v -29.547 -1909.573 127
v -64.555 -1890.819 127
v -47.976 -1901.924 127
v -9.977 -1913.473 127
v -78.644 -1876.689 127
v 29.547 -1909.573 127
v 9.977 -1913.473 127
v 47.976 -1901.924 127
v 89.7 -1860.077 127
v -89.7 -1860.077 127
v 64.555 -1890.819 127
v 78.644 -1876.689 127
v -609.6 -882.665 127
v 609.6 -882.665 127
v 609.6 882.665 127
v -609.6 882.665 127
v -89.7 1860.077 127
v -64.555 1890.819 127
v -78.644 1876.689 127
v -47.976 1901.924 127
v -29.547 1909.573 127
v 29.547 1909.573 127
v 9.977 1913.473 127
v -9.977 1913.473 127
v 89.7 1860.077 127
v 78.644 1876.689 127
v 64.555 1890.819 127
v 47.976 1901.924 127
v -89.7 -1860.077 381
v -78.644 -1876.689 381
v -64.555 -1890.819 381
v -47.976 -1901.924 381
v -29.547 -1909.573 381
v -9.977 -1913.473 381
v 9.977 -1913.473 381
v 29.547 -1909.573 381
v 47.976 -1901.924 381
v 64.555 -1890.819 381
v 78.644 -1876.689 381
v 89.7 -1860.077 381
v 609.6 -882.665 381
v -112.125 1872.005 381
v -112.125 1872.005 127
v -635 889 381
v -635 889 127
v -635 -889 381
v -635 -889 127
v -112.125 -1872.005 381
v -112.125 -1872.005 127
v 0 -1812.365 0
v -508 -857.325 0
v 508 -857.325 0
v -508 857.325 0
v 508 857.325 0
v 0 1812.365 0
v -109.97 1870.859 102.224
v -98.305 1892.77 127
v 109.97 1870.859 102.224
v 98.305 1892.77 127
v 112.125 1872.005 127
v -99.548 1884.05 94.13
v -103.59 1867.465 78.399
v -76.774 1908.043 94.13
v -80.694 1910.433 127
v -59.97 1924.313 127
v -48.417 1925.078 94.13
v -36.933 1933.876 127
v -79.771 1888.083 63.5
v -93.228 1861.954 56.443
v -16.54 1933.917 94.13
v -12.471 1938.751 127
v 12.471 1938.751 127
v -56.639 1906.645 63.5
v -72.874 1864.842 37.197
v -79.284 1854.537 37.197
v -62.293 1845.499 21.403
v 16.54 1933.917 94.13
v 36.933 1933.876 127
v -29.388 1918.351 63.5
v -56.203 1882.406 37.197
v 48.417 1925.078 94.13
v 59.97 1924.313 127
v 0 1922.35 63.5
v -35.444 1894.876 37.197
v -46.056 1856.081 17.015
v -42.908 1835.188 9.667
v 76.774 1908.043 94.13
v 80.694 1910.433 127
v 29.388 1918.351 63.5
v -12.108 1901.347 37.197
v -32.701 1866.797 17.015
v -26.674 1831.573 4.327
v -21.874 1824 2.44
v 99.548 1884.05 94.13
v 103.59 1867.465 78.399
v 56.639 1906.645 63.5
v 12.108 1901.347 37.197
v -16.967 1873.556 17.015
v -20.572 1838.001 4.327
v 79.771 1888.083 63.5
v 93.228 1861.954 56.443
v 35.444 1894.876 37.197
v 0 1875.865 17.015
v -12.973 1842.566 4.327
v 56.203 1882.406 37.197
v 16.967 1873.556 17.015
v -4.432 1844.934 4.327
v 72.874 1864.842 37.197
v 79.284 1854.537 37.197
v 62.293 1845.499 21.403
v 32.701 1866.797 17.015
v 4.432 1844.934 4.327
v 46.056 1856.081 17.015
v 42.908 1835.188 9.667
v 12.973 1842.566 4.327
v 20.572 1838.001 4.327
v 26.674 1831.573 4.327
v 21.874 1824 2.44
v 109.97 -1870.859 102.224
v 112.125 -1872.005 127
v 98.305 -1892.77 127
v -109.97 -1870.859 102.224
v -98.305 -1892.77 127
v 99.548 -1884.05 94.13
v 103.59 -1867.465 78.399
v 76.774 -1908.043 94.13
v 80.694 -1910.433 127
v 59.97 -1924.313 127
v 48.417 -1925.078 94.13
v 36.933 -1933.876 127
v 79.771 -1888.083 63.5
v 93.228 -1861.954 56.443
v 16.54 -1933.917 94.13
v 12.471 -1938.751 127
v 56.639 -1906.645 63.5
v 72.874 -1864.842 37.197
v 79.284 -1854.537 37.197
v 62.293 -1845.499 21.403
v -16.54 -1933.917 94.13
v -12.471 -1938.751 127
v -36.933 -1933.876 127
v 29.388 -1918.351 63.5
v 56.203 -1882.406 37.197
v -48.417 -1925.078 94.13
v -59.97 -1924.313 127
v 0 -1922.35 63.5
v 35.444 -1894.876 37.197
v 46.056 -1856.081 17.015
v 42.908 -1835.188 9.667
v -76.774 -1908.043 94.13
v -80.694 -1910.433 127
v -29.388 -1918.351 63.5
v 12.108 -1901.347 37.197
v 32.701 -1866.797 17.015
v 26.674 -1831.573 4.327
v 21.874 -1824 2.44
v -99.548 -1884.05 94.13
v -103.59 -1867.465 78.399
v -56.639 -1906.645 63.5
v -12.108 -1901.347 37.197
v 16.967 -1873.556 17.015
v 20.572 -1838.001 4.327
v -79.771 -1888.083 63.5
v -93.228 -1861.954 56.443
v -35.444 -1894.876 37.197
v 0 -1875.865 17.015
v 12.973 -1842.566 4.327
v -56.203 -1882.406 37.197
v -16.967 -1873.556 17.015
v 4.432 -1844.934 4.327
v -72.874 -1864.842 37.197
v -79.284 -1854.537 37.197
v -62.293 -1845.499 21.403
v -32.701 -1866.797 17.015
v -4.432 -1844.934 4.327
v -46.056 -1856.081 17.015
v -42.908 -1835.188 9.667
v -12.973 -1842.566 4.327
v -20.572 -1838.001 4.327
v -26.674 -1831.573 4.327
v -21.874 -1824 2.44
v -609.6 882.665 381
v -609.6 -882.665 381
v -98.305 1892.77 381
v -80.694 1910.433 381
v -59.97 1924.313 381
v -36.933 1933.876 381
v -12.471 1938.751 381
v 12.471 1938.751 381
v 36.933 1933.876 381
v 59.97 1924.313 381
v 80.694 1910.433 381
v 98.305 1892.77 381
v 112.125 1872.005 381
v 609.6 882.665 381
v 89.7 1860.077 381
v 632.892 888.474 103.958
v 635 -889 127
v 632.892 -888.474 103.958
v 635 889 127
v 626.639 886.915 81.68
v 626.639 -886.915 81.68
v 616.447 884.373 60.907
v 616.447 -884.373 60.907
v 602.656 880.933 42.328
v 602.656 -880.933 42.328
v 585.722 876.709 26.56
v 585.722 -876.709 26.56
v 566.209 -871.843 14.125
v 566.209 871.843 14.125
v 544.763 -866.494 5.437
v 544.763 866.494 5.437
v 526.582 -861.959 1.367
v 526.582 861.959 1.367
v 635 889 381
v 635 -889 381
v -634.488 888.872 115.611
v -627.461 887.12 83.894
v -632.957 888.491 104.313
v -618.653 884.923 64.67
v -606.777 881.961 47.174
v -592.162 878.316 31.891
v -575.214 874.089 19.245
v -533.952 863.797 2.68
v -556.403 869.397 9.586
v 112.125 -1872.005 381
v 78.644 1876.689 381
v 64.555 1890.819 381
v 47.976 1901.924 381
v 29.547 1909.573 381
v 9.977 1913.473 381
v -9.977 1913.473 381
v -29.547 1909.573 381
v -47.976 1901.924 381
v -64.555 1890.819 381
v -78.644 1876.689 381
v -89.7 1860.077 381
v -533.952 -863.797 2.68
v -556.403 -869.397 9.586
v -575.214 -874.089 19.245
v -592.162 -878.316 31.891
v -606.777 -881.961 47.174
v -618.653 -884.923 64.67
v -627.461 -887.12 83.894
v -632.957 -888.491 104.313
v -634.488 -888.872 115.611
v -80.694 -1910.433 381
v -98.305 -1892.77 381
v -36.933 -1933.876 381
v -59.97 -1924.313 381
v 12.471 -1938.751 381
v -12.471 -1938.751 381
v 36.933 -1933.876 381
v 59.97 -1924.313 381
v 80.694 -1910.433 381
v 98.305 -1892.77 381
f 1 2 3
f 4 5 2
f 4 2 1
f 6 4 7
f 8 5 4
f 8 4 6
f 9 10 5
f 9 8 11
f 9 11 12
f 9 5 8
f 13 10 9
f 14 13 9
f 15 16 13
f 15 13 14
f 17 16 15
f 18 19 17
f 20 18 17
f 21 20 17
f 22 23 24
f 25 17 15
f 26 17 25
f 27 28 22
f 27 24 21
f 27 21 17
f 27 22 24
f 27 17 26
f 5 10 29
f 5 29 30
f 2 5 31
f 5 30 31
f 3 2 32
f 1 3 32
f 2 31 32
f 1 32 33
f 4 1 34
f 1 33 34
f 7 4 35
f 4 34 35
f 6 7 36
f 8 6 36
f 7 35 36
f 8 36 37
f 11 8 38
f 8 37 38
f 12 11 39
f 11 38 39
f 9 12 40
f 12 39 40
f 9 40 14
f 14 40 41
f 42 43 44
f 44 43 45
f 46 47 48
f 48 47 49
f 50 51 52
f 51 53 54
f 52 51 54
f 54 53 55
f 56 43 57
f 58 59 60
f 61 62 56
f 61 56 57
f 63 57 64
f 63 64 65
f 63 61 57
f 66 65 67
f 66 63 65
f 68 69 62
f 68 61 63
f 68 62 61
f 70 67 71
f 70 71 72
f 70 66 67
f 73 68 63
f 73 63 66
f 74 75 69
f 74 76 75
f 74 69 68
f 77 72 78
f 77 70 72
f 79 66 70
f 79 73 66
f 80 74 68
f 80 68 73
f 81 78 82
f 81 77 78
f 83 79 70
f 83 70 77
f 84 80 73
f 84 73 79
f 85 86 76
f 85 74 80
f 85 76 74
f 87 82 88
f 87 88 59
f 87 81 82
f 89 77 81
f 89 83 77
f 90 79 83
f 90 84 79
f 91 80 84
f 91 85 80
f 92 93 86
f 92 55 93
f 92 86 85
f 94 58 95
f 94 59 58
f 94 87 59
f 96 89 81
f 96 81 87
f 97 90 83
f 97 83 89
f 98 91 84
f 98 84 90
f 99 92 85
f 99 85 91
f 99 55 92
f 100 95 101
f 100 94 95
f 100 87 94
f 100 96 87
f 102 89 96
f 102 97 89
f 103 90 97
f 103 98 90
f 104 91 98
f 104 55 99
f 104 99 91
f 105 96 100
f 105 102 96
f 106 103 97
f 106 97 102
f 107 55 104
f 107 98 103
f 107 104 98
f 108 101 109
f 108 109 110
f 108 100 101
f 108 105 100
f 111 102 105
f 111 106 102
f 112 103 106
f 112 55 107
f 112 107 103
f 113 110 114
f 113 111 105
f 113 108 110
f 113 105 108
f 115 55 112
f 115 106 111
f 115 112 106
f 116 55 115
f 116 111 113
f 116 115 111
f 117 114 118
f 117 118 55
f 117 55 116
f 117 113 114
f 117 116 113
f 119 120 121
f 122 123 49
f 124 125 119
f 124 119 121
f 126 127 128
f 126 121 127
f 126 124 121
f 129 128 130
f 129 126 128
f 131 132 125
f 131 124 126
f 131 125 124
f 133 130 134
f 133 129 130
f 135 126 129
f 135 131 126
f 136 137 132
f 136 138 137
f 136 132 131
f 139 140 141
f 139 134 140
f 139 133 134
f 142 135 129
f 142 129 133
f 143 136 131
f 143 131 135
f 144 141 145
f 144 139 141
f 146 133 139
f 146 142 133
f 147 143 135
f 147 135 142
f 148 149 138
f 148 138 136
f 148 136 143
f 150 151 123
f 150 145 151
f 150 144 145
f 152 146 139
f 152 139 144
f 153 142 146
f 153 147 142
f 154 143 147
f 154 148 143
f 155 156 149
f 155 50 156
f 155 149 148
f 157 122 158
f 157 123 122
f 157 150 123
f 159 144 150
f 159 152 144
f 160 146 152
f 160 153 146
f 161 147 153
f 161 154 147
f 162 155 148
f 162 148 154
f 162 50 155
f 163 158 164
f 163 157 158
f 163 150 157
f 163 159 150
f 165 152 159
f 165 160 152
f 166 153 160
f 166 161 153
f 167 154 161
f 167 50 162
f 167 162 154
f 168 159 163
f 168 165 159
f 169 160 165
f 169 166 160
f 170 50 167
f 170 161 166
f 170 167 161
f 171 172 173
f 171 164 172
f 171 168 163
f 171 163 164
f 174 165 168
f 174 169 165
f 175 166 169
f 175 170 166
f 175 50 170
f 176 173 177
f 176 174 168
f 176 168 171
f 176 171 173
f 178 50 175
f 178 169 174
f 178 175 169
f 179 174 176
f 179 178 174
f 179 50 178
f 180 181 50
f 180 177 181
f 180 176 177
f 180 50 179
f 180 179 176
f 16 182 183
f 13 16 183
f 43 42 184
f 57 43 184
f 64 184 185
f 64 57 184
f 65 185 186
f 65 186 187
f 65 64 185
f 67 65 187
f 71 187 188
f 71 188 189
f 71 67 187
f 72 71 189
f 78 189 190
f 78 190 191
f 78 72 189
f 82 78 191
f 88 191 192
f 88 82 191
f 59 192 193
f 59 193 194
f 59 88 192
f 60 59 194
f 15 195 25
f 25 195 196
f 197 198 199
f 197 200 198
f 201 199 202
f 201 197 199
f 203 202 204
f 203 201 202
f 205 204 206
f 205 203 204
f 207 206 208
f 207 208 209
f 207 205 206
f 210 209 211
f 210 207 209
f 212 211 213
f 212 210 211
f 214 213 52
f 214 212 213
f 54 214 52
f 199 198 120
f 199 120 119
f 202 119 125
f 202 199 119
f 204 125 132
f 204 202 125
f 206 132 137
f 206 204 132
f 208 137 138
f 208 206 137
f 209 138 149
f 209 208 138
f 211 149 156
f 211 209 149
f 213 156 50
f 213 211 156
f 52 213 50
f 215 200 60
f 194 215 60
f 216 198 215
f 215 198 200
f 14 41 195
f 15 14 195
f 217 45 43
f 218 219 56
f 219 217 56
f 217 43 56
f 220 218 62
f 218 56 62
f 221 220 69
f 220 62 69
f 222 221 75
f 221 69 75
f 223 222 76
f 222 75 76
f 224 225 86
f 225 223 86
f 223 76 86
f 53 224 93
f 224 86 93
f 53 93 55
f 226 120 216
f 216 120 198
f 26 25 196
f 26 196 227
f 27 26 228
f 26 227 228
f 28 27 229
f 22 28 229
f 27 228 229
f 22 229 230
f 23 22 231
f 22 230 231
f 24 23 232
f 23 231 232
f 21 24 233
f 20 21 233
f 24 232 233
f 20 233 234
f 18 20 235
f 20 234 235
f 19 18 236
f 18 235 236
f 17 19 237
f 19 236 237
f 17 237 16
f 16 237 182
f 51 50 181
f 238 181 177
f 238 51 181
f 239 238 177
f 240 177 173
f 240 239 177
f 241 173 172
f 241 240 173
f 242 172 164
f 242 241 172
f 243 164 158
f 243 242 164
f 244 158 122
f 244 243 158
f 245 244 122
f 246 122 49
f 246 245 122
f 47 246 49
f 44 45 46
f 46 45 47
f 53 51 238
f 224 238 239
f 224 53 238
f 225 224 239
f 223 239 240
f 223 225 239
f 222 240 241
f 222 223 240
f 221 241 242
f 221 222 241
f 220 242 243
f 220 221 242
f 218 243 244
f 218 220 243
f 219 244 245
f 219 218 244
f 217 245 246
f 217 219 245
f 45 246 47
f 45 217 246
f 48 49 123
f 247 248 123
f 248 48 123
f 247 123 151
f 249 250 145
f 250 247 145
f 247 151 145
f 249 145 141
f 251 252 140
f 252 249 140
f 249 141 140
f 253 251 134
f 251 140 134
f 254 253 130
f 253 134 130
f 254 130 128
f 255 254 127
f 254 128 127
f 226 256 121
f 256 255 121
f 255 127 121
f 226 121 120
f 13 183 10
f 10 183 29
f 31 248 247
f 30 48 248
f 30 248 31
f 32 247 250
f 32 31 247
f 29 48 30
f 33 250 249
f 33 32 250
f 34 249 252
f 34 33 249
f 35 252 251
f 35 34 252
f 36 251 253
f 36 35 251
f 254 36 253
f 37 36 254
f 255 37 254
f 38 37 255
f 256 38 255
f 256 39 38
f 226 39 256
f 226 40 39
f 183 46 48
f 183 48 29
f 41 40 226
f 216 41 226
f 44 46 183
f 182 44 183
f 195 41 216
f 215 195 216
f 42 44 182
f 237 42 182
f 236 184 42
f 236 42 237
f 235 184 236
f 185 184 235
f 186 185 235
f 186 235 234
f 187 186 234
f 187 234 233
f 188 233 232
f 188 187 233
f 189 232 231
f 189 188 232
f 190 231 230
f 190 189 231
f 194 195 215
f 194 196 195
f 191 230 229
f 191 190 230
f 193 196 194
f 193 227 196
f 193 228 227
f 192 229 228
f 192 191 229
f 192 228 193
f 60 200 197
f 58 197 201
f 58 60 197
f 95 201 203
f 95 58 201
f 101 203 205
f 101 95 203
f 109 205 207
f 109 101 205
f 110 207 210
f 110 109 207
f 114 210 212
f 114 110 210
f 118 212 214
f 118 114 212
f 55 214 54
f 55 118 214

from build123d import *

# Parameters (mm, degrees)
F1_DEPTH     = 381
F2_R         = 127
F3_T1_DEPTH  = 1430.9172960673
F3_T3_DEPTH  = 2413
F3_T5_DEPTH  = 1430.9172960673
F3_T7_DEPTH  = 850.9
F3_T12_DEPTH = 127
F3_T18_DEPTH = 127
F5_DEPTH     = 254


# Not quite as in the source:
# - a fillet or chamfer that OpenCascade refuses, or shapes differently, is made with other operations: its cross-section is extruded or revolved along the edge and cut away or added


with BuildPart() as f1:
    # F0 (on Top) → F1 (new body)
    with BuildSketch(Plane.XY):
        Polygon((-635, 0), (0, 0), (0, 2082.8), (-635, 889), align=None)
        Polygon((635, 0), (0, 0), (-635, 0), (-635, -889), (0, -2082.8), (635, -889), align=None)
        Polygon((0, 2082.8), (0, 0), (635, 0), (635, 889), align=None)
    extrude(amount=F1_DEPTH)

    # F2
    f2_edges = [f1.edges().sort_by_distance(p)[0] for p in [
        (635, 0, 0),
        (317.5, -1485.9, 0),
        (317.5, 1485.9, 0),
    ]]
    fillet(f2_edges, radius=F2_R)

    # F3: fillet of radius 127 on 3 edges, made by hand

    # F3_s2 → F3_t1 (cut)
    with BuildSketch(Plane(origin=(751.4214309895, 1412.6722902602, 0), x_dir=(0, 0, 1), z_dir=(-0.469612973, -0.8828723892, 0))):
        with BuildLine():
            ThreePointArc((127, 978.1099001193), (37.1974387893, 940.91246133), (0, 851.1099001193))
            Line((0, 851.1099001193), (0, 978.1099001193))
            Line((0, 978.1099001193), (127, 978.1099001193))
        make_face()
    extrude(amount=F3_T1_DEPTH, mode=Mode.SUBTRACT)

    # F3_s4 → F3_t3 (cut)
    with BuildSketch(Plane.XZ.offset(-1206.5)):
        with BuildLine():
            ThreePointArc((-508, 0), (-597.8025612107, 37.1974387893), (-635, 127))
            Line((-635, 127), (-635, 0))
            Line((-635, 0), (-508, 0))
        make_face()
    extrude(amount=F3_T3_DEPTH, mode=Mode.SUBTRACT)

    # F3_s6 → F3_t5 (cut)
    with BuildSketch(Plane(origin=(79.4441054972, -149.3549183347, 0), x_dir=(0, 0, 1), z_dir=(0.469612973, -0.8828723892, 0))):
        with BuildLine():
            ThreePointArc((0, 851.1099001193), (37.1974387893, 940.91246133), (127, 978.1099001193))
            Line((127, 978.1099001193), (0, 978.1099001193))
            Line((0, 978.1099001193), (0, 851.1099001193))
        make_face()
    extrude(amount=F3_T5_DEPTH, mode=Mode.SUBTRACT)

    # F3_s8 → F3_t7 (cut)
    with BuildSketch(Plane.XY.offset(127)):
        with BuildLine():
            ThreePointArc((-112.1247934283, -1872.0053883548), (0, -1939.3645407865), (112.1247934283, -1872.0053883548))
            Line((112.1247934283, -1872.0053883548), (0, -2082.8))
            Line((0, -2082.8), (-112.1247934283, -1872.0053883548))
        make_face()
        with BuildLine():
            ThreePointArc((-112.1247934283, 1872.0053883548), (0, 1939.3645407865), (112.1247934283, 1872.0053883548))
            Line((112.1247934283, 1872.0053883548), (0, 2082.8))
            Line((0, 2082.8), (-112.1247934283, 1872.0053883548))
        make_face()
    extrude(amount=F3_T7_DEPTH, mode=Mode.SUBTRACT)


with BuildPart() as f3_tool10:
    # F3_s11 → F3_t12 (new body)
    with BuildSketch(Plane.XY.offset(127)):
        Polygon((0, -1812.3645407865), (-112.1247934283, -1872.0053883548), (0, -2082.8), (112.1247934283, -1872.0053883548), align=None)
    extrude(amount=-F3_T12_DEPTH)

    # F3_s13 → F3_t14 (revolve, cut)
    with BuildSketch(Plane(origin=(0, -1812.3645407865, 127), x_dir=(0, 1, 0), z_dir=(-1, 0, 0))):
        with BuildLine():
            ThreePointArc((0, -127), (127, 0), (0, 127))
            Line((0, 127), (0, -127))
        make_face()
    revolve(axis=Axis((0, -1812.3645407865, 127), (0, 0, -1)), mode=Mode.SUBTRACT)


with BuildPart() as f1_1:
    add(f1.part)

    # F3_t9: cut F3_tool10
    add(f3_tool10.part, mode=Mode.SUBTRACT)


with BuildPart() as f3_tool16:
    # F3_s17 → F3_t18 (new body)
    with BuildSketch(Plane.XY.offset(127)):
        Polygon((0, 1812.3645407865), (-112.1247934283, 1872.0053883548), (0, 2082.8), (112.1247934283, 1872.0053883548), align=None)
    extrude(amount=-F3_T18_DEPTH)

    # F3_s19 → F3_t20 (revolve, cut)
    with BuildSketch(Plane(origin=(0, 1812.3645407865, 127), x_dir=(0, -1, 0), z_dir=(1, 0, 0))):
        with BuildLine():
            ThreePointArc((0, -127), (127, 0), (0, 127))
            Line((0, 127), (0, -127))
        make_face()
    revolve(axis=Axis((0, 1812.3645407865, 127), (0, 0, -1)), mode=Mode.SUBTRACT)


with BuildPart() as f1_2:
    add(f1_1.part)

    # F3_t15: cut F3_tool16
    add(f3_tool16.part, mode=Mode.SUBTRACT)

    # F4 (on face) → F5 (cut)
    with BuildSketch(Plane.XY.offset(381)):
        with BuildLine():
            Line((-609.6, -882.6649081573), (-89.6998347426, -1860.0772188411))
            ThreePointArc((-89.6998347426, -1860.0772188411), (0, -1913.9645407865), (89.6998347426, -1860.0772188411))
            Line((89.6998347426, -1860.0772188411), (609.6, -882.6649081573))
            Line((609.6, -882.6649081573), (609.6, 882.6649081573))
            Line((609.6, 882.6649081573), (89.6998347426, 1860.0772188411))
            ThreePointArc((89.6998347426, 1860.0772188411), (0, 1913.9645407865), (-89.6998347426, 1860.0772188411))
            Line((-89.6998347426, 1860.0772188411), (-609.6, 882.6649081573))
            Line((-609.6, 882.6649081573), (-609.6, -882.6649081573))
        make_face()
    extrude(amount=-F5_DEPTH, mode=Mode.SUBTRACT)


solid = f1_2.part
